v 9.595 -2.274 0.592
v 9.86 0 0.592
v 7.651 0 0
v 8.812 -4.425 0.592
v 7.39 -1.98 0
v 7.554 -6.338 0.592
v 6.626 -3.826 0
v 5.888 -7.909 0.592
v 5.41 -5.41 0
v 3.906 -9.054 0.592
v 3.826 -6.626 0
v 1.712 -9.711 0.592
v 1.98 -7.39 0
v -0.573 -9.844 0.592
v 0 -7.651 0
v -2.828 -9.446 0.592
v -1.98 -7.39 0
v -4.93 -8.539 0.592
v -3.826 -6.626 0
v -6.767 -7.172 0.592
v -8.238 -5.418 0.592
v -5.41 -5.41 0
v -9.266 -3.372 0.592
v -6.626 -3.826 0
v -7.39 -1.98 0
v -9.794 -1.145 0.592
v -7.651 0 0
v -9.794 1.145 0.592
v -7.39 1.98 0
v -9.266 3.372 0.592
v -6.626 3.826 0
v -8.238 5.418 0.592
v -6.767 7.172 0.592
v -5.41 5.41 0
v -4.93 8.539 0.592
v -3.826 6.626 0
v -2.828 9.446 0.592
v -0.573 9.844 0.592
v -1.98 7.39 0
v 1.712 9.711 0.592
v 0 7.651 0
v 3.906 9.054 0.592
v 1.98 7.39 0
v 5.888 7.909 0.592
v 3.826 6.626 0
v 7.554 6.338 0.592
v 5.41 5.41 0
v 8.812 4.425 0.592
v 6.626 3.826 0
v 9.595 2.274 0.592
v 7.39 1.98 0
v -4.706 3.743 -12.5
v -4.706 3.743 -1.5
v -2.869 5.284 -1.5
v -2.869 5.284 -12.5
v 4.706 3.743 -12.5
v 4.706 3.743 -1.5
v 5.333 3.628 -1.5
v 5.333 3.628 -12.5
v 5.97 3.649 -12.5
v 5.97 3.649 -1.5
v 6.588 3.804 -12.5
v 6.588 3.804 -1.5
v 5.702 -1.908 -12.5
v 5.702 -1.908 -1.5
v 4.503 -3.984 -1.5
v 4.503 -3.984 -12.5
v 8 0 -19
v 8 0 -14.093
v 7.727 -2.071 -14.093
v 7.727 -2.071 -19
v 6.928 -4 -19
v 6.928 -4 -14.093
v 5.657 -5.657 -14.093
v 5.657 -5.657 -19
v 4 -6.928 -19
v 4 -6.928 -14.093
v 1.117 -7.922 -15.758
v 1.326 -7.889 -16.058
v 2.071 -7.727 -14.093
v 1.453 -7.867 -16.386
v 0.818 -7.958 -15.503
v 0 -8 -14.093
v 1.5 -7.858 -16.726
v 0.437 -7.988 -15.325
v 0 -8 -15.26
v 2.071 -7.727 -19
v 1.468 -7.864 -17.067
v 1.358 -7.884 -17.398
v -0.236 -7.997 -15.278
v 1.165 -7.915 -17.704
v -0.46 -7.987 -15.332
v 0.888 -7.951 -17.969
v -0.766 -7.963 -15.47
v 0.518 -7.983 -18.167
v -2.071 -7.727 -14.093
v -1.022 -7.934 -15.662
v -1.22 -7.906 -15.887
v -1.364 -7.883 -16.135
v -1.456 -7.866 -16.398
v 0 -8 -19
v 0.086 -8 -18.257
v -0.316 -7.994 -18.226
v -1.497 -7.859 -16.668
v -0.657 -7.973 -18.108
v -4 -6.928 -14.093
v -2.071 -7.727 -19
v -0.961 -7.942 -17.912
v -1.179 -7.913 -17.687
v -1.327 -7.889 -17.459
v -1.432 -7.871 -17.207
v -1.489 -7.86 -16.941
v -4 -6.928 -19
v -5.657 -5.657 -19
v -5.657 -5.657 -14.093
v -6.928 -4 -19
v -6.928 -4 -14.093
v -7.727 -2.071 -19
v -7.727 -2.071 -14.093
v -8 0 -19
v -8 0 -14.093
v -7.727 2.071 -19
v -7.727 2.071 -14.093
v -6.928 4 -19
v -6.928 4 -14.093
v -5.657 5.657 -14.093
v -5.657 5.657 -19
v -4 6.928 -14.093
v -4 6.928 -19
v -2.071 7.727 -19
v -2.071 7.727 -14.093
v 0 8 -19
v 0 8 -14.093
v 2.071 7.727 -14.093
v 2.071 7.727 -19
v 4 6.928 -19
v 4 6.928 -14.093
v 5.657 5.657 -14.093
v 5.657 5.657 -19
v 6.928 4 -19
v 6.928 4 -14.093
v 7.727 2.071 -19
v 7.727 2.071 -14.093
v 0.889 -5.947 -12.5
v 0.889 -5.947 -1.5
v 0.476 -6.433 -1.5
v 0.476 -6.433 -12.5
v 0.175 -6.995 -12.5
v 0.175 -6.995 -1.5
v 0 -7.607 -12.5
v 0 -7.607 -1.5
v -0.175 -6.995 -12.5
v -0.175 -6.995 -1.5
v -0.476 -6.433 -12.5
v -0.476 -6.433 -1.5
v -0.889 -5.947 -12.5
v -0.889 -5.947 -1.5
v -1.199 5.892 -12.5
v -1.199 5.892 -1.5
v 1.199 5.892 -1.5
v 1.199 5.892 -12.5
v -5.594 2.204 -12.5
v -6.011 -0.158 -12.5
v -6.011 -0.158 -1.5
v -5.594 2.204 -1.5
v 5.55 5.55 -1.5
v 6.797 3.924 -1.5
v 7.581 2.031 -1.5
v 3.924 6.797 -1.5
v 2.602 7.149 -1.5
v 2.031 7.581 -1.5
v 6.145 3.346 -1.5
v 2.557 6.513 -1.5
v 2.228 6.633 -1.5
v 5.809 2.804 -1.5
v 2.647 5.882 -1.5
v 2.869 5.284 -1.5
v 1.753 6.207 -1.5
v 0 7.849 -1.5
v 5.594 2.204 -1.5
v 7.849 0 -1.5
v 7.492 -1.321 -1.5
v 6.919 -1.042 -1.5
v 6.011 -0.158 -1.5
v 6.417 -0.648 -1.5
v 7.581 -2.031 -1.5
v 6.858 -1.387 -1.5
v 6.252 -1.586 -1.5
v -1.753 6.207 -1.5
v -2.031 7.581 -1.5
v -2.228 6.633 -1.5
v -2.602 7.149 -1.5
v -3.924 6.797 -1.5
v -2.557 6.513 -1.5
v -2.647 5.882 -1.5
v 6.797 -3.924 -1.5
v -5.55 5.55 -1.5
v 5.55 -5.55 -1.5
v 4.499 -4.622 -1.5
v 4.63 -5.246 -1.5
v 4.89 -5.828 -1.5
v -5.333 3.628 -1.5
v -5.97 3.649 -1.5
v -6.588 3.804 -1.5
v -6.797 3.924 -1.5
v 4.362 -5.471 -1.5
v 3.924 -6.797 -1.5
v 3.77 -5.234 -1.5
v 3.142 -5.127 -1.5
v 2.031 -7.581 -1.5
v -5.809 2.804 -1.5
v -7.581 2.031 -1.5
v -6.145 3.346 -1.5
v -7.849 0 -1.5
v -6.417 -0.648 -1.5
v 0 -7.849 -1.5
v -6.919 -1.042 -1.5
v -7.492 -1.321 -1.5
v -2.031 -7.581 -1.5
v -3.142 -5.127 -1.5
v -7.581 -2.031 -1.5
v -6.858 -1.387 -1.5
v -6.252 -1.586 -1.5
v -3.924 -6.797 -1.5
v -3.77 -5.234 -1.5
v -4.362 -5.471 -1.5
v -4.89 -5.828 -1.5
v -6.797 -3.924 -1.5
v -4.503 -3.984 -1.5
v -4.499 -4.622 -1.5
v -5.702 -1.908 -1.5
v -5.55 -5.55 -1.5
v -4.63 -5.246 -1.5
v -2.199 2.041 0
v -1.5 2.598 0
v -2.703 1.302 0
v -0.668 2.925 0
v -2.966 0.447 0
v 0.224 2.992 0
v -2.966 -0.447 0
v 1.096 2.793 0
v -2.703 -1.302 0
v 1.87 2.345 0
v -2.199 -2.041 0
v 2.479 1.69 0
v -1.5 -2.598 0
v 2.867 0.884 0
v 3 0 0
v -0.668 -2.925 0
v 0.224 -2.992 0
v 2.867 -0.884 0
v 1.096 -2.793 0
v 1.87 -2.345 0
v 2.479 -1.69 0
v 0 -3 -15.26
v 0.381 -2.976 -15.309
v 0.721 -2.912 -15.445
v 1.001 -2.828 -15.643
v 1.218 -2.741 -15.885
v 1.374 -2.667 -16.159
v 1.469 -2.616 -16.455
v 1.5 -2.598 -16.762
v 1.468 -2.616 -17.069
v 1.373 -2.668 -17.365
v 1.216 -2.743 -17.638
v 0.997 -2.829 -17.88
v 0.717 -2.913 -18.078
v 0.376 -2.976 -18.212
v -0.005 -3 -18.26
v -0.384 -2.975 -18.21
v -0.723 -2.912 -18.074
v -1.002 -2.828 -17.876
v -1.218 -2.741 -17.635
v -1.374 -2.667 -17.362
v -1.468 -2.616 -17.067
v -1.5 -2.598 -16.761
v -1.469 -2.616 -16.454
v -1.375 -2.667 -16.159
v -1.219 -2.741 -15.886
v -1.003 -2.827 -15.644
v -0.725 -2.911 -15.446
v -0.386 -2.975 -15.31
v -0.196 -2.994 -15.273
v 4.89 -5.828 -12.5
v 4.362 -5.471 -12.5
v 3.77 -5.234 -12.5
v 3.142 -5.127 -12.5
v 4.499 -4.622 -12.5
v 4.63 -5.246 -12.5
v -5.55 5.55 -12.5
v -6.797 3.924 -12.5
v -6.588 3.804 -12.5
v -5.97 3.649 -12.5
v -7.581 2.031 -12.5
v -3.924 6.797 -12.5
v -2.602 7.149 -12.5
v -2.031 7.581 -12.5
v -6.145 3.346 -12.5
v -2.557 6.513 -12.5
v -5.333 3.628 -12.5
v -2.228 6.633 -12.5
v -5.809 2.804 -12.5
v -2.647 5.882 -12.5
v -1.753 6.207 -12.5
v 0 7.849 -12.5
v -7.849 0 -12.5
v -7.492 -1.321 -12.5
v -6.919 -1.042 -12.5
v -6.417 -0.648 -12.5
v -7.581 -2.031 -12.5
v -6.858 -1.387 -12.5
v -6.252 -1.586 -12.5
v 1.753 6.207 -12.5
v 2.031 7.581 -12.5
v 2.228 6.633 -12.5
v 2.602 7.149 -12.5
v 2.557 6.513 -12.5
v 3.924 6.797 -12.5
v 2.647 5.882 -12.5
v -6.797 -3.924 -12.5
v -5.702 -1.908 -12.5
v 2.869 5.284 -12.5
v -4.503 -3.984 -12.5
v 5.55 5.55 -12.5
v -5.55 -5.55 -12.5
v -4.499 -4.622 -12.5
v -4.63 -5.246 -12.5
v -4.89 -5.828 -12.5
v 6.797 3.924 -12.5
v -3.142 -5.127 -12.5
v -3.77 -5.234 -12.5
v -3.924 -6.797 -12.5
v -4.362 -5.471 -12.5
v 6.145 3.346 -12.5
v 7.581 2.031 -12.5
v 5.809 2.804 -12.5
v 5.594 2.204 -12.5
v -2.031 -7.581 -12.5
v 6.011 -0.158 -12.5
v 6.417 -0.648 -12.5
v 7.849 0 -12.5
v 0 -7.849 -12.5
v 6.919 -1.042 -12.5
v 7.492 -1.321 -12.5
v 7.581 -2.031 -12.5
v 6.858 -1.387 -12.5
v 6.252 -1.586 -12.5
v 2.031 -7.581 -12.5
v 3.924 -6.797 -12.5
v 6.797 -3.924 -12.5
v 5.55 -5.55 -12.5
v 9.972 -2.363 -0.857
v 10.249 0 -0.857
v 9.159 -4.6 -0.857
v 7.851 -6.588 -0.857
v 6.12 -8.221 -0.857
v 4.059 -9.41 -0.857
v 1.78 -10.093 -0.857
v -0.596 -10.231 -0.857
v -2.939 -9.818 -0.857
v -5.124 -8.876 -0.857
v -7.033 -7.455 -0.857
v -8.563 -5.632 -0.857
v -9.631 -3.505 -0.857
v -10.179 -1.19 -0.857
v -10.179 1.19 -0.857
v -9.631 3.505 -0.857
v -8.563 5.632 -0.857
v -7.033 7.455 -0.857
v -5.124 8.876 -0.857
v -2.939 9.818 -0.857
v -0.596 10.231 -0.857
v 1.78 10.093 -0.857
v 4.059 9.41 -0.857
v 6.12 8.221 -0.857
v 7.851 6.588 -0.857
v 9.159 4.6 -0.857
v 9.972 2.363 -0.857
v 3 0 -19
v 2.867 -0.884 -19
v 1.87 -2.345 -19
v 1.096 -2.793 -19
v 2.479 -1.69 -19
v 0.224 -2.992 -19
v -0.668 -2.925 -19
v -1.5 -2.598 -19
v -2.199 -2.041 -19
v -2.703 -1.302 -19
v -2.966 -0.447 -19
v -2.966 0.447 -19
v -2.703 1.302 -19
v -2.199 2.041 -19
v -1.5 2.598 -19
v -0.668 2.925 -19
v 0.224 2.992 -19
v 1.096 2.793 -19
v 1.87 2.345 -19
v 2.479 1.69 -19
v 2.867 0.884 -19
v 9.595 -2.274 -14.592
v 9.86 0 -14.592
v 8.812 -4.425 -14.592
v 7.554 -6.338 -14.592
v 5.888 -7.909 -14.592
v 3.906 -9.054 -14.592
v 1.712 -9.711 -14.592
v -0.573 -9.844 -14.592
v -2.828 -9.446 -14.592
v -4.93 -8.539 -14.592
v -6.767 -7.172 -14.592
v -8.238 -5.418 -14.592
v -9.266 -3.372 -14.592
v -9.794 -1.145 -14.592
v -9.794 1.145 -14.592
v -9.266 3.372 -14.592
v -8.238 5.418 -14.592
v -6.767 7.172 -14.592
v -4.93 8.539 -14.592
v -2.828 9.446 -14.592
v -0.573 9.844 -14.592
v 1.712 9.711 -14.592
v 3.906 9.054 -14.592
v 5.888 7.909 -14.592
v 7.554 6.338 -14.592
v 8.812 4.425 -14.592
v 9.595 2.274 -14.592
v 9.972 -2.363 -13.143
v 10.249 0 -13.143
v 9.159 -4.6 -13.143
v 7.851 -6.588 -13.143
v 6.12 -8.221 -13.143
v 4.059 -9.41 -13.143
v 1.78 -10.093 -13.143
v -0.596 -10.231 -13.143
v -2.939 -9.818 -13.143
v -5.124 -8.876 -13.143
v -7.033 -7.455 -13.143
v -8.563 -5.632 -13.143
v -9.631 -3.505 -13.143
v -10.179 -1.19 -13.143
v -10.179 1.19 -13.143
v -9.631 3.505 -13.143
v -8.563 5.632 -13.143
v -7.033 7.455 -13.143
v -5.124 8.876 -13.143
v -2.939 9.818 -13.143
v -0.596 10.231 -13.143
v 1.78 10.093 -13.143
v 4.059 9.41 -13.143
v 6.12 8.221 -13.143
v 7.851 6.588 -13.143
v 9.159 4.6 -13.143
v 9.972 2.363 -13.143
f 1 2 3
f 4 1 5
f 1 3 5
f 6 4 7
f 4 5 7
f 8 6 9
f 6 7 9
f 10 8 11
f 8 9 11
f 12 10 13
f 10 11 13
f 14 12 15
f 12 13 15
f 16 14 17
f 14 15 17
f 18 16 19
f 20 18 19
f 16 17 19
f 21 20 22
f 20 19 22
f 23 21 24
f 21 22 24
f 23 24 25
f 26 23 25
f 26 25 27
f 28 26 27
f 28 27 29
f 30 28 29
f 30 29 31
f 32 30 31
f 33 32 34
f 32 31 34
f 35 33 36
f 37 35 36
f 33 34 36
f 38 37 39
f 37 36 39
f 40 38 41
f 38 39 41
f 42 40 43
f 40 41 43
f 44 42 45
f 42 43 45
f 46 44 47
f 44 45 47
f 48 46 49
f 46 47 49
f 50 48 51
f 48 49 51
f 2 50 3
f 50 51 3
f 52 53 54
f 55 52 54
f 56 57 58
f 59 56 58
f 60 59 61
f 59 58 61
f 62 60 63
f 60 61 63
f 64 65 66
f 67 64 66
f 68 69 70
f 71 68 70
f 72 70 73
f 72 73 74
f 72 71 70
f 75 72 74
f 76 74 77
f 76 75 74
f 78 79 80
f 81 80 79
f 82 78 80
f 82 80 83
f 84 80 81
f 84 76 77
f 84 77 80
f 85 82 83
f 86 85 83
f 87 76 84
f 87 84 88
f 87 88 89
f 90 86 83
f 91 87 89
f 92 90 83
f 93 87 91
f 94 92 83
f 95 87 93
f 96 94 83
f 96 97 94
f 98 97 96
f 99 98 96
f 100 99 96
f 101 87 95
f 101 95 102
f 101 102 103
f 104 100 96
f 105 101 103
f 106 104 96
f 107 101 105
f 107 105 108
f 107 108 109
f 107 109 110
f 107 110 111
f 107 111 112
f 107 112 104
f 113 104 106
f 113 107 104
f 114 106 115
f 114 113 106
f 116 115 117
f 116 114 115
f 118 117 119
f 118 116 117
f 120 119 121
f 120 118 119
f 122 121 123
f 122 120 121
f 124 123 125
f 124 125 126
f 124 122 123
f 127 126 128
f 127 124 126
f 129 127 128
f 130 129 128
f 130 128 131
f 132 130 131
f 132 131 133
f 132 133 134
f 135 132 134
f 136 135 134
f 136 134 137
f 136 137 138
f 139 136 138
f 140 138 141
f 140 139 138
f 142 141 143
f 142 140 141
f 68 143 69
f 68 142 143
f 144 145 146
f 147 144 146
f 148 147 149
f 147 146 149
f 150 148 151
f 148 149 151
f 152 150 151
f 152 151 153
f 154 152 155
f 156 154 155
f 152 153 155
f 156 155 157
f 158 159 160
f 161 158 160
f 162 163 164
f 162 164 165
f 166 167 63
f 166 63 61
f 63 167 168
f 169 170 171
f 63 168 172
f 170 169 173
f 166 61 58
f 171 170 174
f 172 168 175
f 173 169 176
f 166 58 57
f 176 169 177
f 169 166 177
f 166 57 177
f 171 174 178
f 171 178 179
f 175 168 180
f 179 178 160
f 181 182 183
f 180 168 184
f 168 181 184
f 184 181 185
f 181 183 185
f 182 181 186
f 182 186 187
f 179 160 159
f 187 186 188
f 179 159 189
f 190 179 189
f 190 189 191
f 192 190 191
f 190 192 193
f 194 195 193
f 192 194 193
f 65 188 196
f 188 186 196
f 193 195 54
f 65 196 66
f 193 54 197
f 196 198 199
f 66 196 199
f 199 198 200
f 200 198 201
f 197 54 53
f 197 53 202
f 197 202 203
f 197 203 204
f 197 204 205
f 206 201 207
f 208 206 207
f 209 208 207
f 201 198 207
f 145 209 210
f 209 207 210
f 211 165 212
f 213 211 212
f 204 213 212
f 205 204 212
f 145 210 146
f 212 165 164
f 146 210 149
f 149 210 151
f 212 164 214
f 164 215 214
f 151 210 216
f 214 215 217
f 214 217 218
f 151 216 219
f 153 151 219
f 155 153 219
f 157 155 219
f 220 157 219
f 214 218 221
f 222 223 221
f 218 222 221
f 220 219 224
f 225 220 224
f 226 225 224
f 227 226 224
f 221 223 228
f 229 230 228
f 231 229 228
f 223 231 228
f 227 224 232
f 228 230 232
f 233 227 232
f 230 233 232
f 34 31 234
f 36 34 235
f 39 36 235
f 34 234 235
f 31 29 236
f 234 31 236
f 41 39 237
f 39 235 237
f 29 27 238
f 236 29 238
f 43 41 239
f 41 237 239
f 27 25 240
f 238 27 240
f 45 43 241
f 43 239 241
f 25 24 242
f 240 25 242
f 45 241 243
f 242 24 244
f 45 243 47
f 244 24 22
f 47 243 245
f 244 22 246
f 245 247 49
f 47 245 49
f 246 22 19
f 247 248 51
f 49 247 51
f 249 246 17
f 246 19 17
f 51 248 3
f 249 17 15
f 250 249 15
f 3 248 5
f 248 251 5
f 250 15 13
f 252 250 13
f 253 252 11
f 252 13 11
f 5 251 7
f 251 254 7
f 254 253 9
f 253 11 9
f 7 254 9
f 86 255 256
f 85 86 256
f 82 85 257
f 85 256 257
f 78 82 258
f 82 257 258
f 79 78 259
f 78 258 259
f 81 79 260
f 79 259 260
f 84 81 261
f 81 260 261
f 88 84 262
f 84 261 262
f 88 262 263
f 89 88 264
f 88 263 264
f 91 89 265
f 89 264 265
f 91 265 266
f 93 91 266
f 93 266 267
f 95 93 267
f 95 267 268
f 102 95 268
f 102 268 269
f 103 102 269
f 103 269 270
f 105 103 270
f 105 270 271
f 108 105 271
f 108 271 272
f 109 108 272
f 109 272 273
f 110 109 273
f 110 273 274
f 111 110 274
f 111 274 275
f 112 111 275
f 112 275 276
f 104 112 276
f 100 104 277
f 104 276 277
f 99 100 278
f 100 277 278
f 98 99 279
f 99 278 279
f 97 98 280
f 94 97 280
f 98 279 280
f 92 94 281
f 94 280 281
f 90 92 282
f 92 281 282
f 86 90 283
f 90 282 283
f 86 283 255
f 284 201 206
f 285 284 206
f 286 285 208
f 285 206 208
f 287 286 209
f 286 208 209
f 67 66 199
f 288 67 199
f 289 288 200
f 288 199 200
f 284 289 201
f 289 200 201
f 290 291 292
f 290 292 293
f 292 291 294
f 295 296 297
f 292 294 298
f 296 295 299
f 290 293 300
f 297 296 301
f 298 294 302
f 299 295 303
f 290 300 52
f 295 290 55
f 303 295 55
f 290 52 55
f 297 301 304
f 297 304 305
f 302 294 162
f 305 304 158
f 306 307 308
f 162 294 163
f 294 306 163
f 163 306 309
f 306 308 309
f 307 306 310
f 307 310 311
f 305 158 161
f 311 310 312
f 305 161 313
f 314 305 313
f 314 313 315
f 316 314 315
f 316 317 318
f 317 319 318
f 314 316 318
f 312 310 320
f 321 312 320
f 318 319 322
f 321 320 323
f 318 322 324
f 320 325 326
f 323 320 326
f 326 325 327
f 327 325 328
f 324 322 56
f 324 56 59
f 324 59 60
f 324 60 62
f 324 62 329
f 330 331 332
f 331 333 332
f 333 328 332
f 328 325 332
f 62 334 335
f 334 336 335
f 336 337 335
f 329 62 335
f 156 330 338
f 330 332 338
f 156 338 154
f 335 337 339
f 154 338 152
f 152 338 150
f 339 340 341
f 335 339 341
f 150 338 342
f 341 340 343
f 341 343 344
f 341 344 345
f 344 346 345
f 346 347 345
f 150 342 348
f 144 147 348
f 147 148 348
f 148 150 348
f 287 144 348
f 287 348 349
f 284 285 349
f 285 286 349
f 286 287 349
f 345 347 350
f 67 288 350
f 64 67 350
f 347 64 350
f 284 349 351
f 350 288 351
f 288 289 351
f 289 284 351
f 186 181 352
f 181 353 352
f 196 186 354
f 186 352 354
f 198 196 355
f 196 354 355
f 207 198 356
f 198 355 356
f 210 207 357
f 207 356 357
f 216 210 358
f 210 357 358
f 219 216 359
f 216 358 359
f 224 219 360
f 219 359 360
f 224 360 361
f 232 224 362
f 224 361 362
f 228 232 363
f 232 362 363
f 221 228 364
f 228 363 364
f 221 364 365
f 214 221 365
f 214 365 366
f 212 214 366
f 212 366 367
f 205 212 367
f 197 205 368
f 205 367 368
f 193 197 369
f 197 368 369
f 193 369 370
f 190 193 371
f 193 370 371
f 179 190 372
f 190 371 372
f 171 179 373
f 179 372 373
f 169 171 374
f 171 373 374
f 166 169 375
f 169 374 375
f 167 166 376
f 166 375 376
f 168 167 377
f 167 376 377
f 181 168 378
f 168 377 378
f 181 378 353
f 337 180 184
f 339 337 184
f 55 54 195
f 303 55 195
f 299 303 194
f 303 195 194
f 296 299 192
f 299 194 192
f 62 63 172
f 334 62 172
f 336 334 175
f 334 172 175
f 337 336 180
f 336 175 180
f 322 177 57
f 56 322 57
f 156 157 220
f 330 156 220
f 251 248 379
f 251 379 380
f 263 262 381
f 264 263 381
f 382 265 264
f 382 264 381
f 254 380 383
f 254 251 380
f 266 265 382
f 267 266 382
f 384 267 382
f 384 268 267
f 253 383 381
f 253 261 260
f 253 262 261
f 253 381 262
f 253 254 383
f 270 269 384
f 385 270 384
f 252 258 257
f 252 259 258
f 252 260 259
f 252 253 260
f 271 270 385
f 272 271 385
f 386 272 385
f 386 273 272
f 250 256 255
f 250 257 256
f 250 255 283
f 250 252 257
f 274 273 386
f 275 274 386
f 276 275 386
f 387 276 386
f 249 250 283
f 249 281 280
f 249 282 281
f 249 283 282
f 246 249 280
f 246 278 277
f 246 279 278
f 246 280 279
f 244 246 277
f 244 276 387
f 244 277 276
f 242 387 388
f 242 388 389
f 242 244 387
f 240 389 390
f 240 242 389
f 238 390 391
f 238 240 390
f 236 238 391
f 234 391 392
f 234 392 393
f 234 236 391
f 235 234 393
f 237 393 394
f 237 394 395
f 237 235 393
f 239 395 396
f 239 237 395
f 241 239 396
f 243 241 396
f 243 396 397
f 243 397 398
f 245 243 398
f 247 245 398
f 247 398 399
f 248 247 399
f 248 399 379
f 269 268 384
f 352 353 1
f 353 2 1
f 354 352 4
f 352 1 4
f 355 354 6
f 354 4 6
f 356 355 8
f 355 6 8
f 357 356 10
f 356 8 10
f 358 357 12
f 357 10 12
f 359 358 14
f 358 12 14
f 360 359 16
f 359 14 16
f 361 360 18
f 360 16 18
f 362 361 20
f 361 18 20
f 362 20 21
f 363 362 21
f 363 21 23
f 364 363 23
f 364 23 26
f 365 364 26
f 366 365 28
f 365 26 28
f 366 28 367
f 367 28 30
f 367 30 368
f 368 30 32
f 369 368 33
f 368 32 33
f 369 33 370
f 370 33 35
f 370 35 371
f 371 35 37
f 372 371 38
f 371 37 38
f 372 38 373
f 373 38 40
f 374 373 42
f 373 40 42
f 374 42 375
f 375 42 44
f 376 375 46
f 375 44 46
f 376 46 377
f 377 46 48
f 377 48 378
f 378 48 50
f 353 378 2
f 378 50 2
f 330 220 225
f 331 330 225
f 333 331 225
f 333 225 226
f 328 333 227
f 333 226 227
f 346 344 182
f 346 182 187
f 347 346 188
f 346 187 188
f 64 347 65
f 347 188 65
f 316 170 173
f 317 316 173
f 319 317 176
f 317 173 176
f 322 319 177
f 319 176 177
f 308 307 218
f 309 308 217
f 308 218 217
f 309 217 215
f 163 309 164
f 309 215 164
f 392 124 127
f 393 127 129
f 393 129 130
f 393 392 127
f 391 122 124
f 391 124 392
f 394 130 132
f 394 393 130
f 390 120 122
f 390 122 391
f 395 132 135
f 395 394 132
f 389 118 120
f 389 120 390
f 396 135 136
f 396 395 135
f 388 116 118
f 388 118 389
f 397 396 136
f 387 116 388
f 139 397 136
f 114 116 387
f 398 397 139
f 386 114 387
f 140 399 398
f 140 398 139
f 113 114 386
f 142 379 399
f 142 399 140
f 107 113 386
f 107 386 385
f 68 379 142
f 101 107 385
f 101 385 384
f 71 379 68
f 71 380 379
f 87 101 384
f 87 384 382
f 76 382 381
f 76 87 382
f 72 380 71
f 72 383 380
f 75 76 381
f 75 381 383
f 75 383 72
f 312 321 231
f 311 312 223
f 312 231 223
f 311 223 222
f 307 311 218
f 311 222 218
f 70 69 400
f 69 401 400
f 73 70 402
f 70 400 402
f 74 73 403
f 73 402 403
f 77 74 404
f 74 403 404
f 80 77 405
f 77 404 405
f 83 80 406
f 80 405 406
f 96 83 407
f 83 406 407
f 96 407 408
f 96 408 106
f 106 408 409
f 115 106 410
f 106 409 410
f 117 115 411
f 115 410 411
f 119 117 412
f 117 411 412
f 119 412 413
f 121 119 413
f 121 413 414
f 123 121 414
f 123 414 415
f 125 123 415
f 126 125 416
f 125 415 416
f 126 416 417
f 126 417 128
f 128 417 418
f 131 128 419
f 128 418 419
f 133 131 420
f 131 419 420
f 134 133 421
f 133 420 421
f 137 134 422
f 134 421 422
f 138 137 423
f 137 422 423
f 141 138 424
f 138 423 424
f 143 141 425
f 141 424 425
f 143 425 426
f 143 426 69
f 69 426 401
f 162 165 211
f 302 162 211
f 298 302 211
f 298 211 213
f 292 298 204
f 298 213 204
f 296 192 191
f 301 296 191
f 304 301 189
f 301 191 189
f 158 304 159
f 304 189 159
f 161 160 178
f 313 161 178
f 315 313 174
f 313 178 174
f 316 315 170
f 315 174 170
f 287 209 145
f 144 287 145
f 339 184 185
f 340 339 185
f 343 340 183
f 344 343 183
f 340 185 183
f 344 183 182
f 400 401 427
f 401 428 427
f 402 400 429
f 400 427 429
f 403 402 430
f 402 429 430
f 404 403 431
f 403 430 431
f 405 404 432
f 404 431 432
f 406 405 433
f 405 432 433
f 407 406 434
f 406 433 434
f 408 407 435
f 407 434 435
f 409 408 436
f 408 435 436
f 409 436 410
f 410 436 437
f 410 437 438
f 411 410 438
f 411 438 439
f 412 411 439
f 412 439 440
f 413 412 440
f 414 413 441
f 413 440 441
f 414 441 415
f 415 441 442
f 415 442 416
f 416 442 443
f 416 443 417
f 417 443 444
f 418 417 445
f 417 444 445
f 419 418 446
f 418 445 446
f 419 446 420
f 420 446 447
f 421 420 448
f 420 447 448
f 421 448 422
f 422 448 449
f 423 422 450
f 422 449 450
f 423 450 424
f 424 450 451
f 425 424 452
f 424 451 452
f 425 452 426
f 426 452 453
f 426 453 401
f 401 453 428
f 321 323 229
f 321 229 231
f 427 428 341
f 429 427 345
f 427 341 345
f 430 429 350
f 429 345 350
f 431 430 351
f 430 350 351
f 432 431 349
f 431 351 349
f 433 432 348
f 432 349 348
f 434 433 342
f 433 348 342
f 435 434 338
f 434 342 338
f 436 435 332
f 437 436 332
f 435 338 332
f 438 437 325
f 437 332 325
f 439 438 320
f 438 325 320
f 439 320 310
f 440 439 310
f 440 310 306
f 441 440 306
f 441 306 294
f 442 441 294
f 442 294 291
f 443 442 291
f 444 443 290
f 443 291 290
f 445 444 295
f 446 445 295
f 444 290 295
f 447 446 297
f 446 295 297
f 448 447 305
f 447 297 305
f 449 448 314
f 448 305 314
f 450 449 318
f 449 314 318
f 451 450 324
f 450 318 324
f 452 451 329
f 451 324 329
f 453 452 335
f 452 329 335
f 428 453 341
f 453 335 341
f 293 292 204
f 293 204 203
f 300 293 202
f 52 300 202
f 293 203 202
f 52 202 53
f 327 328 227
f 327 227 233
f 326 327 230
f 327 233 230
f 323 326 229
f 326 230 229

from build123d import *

# Parameters (mm, degrees)
CUT_EXTRUDE1_DEPTH = 14
CIRPATTERN17_COUNT = 9
SKETCH6_R          = 1.5
CUT_EXTRUDE2_DEPTH = 10


with BuildPart() as part:
    # Sketch1 → Revolve1 (revolve)
    with BuildSketch(Plane(origin=(0, 0, 0), x_dir=(0, 0, -1), z_dir=(1, 0, 0)), mode=Mode.PRIVATE) as revolve1_sk:
        Polygon((0, 3), (0, 10), (14, 10), (14, 8), (19, 8), (19, 3), align=None)
    revolve(revolve1_sk.sketch.rotate(Axis((0, 0, 55), (0, 0, -1)), 90), axis=Axis((0, 0, 55), (0, 0, -1)))

    # Sketch2 → Cut-Extrude1 (cut)
    with BuildSketch(Plane.XY):
        with BuildLine():
            Line((3.674262438, 8.642141394), (3.75, 8.642141394))
            Line((3.75, 8.642141394), (3.75, 10.642141394))
            Line((3.75, 10.642141394), (-3.75, 10.642141394))
            Line((-3.75, 10.642141394), (-3.75, 8.642141394))
            Line((-3.75, 8.642141394), (-3.674262438, 8.642141394))
            ThreePointArc((-3.674262438, 8.642141394), (-3.199910012, 8.473080096), (-2.93940995, 8.04211413))
            ThreePointArc((-2.93940995, 8.04211413), (-2.331794227, 6.754484031), (-1.198957881, 5.892005073))
            Line((-1.198957881, 5.892005073), (1.198957881, 5.892005073))
            ThreePointArc((1.198957881, 5.892005073), (2.331794227, 6.754484031), (2.93940995, 8.04211413))
            ThreePointArc((2.93940995, 8.04211413), (3.199910012, 8.473080096), (3.674262438, 8.642141394))
        make_face()
    cut_extrude1 = extrude(amount=-CUT_EXTRUDE1_DEPTH, mode=Mode.SUBTRACT)

    # CirPattern17: Cut-Extrude1 ×9 about axis
    cirpattern17_axis = Axis((0, 0, 0), (0, 0, 1))
    for i in range(1, CIRPATTERN17_COUNT):
        add(cut_extrude1.rotate(cirpattern17_axis, i * 360 / CIRPATTERN17_COUNT), mode=Mode.SUBTRACT)

    # Sketch3 → Revolve2 (revolve)
    with BuildSketch(Plane(origin=(0, 0, 0), x_dir=(0, 0, -1), z_dir=(1, 0, 0)), mode=Mode.PRIVATE) as revolve2_sk:
        Polygon((0, 7.651144903), (0, 3.803703196), (1.5, 3.803703196), (1.5, 7.848623649), (0.856921938, 10.248623649), (-0.591966801, 9.860395082), align=None)
        Polygon((14.591966801, 9.860395082), (13.143078062, 10.248623649), (12.5, 7.848623649), (12.5, 3.803703196), (14, 3.803703196), (14, 7.651144903), align=None)
    revolve(revolve2_sk.sketch.rotate(Axis((0, 0, 55), (0, 0, -1)), 90), axis=Axis((0, 0, 55), (0, 0, -1)))

    # Sketch6 → Cut-Extrude2 (cut)
    with BuildSketch(Plane(origin=(0, 0, 0), x_dir=(1, 0, 0), z_dir=(0, 1, 0))):
        with Locations(Location((0, 16.759840403, 0), (0, 0, 270))):
            Circle(SKETCH6_R)
    extrude(amount=-CUT_EXTRUDE2_DEPTH, mode=Mode.SUBTRACT)


solid = part.part
